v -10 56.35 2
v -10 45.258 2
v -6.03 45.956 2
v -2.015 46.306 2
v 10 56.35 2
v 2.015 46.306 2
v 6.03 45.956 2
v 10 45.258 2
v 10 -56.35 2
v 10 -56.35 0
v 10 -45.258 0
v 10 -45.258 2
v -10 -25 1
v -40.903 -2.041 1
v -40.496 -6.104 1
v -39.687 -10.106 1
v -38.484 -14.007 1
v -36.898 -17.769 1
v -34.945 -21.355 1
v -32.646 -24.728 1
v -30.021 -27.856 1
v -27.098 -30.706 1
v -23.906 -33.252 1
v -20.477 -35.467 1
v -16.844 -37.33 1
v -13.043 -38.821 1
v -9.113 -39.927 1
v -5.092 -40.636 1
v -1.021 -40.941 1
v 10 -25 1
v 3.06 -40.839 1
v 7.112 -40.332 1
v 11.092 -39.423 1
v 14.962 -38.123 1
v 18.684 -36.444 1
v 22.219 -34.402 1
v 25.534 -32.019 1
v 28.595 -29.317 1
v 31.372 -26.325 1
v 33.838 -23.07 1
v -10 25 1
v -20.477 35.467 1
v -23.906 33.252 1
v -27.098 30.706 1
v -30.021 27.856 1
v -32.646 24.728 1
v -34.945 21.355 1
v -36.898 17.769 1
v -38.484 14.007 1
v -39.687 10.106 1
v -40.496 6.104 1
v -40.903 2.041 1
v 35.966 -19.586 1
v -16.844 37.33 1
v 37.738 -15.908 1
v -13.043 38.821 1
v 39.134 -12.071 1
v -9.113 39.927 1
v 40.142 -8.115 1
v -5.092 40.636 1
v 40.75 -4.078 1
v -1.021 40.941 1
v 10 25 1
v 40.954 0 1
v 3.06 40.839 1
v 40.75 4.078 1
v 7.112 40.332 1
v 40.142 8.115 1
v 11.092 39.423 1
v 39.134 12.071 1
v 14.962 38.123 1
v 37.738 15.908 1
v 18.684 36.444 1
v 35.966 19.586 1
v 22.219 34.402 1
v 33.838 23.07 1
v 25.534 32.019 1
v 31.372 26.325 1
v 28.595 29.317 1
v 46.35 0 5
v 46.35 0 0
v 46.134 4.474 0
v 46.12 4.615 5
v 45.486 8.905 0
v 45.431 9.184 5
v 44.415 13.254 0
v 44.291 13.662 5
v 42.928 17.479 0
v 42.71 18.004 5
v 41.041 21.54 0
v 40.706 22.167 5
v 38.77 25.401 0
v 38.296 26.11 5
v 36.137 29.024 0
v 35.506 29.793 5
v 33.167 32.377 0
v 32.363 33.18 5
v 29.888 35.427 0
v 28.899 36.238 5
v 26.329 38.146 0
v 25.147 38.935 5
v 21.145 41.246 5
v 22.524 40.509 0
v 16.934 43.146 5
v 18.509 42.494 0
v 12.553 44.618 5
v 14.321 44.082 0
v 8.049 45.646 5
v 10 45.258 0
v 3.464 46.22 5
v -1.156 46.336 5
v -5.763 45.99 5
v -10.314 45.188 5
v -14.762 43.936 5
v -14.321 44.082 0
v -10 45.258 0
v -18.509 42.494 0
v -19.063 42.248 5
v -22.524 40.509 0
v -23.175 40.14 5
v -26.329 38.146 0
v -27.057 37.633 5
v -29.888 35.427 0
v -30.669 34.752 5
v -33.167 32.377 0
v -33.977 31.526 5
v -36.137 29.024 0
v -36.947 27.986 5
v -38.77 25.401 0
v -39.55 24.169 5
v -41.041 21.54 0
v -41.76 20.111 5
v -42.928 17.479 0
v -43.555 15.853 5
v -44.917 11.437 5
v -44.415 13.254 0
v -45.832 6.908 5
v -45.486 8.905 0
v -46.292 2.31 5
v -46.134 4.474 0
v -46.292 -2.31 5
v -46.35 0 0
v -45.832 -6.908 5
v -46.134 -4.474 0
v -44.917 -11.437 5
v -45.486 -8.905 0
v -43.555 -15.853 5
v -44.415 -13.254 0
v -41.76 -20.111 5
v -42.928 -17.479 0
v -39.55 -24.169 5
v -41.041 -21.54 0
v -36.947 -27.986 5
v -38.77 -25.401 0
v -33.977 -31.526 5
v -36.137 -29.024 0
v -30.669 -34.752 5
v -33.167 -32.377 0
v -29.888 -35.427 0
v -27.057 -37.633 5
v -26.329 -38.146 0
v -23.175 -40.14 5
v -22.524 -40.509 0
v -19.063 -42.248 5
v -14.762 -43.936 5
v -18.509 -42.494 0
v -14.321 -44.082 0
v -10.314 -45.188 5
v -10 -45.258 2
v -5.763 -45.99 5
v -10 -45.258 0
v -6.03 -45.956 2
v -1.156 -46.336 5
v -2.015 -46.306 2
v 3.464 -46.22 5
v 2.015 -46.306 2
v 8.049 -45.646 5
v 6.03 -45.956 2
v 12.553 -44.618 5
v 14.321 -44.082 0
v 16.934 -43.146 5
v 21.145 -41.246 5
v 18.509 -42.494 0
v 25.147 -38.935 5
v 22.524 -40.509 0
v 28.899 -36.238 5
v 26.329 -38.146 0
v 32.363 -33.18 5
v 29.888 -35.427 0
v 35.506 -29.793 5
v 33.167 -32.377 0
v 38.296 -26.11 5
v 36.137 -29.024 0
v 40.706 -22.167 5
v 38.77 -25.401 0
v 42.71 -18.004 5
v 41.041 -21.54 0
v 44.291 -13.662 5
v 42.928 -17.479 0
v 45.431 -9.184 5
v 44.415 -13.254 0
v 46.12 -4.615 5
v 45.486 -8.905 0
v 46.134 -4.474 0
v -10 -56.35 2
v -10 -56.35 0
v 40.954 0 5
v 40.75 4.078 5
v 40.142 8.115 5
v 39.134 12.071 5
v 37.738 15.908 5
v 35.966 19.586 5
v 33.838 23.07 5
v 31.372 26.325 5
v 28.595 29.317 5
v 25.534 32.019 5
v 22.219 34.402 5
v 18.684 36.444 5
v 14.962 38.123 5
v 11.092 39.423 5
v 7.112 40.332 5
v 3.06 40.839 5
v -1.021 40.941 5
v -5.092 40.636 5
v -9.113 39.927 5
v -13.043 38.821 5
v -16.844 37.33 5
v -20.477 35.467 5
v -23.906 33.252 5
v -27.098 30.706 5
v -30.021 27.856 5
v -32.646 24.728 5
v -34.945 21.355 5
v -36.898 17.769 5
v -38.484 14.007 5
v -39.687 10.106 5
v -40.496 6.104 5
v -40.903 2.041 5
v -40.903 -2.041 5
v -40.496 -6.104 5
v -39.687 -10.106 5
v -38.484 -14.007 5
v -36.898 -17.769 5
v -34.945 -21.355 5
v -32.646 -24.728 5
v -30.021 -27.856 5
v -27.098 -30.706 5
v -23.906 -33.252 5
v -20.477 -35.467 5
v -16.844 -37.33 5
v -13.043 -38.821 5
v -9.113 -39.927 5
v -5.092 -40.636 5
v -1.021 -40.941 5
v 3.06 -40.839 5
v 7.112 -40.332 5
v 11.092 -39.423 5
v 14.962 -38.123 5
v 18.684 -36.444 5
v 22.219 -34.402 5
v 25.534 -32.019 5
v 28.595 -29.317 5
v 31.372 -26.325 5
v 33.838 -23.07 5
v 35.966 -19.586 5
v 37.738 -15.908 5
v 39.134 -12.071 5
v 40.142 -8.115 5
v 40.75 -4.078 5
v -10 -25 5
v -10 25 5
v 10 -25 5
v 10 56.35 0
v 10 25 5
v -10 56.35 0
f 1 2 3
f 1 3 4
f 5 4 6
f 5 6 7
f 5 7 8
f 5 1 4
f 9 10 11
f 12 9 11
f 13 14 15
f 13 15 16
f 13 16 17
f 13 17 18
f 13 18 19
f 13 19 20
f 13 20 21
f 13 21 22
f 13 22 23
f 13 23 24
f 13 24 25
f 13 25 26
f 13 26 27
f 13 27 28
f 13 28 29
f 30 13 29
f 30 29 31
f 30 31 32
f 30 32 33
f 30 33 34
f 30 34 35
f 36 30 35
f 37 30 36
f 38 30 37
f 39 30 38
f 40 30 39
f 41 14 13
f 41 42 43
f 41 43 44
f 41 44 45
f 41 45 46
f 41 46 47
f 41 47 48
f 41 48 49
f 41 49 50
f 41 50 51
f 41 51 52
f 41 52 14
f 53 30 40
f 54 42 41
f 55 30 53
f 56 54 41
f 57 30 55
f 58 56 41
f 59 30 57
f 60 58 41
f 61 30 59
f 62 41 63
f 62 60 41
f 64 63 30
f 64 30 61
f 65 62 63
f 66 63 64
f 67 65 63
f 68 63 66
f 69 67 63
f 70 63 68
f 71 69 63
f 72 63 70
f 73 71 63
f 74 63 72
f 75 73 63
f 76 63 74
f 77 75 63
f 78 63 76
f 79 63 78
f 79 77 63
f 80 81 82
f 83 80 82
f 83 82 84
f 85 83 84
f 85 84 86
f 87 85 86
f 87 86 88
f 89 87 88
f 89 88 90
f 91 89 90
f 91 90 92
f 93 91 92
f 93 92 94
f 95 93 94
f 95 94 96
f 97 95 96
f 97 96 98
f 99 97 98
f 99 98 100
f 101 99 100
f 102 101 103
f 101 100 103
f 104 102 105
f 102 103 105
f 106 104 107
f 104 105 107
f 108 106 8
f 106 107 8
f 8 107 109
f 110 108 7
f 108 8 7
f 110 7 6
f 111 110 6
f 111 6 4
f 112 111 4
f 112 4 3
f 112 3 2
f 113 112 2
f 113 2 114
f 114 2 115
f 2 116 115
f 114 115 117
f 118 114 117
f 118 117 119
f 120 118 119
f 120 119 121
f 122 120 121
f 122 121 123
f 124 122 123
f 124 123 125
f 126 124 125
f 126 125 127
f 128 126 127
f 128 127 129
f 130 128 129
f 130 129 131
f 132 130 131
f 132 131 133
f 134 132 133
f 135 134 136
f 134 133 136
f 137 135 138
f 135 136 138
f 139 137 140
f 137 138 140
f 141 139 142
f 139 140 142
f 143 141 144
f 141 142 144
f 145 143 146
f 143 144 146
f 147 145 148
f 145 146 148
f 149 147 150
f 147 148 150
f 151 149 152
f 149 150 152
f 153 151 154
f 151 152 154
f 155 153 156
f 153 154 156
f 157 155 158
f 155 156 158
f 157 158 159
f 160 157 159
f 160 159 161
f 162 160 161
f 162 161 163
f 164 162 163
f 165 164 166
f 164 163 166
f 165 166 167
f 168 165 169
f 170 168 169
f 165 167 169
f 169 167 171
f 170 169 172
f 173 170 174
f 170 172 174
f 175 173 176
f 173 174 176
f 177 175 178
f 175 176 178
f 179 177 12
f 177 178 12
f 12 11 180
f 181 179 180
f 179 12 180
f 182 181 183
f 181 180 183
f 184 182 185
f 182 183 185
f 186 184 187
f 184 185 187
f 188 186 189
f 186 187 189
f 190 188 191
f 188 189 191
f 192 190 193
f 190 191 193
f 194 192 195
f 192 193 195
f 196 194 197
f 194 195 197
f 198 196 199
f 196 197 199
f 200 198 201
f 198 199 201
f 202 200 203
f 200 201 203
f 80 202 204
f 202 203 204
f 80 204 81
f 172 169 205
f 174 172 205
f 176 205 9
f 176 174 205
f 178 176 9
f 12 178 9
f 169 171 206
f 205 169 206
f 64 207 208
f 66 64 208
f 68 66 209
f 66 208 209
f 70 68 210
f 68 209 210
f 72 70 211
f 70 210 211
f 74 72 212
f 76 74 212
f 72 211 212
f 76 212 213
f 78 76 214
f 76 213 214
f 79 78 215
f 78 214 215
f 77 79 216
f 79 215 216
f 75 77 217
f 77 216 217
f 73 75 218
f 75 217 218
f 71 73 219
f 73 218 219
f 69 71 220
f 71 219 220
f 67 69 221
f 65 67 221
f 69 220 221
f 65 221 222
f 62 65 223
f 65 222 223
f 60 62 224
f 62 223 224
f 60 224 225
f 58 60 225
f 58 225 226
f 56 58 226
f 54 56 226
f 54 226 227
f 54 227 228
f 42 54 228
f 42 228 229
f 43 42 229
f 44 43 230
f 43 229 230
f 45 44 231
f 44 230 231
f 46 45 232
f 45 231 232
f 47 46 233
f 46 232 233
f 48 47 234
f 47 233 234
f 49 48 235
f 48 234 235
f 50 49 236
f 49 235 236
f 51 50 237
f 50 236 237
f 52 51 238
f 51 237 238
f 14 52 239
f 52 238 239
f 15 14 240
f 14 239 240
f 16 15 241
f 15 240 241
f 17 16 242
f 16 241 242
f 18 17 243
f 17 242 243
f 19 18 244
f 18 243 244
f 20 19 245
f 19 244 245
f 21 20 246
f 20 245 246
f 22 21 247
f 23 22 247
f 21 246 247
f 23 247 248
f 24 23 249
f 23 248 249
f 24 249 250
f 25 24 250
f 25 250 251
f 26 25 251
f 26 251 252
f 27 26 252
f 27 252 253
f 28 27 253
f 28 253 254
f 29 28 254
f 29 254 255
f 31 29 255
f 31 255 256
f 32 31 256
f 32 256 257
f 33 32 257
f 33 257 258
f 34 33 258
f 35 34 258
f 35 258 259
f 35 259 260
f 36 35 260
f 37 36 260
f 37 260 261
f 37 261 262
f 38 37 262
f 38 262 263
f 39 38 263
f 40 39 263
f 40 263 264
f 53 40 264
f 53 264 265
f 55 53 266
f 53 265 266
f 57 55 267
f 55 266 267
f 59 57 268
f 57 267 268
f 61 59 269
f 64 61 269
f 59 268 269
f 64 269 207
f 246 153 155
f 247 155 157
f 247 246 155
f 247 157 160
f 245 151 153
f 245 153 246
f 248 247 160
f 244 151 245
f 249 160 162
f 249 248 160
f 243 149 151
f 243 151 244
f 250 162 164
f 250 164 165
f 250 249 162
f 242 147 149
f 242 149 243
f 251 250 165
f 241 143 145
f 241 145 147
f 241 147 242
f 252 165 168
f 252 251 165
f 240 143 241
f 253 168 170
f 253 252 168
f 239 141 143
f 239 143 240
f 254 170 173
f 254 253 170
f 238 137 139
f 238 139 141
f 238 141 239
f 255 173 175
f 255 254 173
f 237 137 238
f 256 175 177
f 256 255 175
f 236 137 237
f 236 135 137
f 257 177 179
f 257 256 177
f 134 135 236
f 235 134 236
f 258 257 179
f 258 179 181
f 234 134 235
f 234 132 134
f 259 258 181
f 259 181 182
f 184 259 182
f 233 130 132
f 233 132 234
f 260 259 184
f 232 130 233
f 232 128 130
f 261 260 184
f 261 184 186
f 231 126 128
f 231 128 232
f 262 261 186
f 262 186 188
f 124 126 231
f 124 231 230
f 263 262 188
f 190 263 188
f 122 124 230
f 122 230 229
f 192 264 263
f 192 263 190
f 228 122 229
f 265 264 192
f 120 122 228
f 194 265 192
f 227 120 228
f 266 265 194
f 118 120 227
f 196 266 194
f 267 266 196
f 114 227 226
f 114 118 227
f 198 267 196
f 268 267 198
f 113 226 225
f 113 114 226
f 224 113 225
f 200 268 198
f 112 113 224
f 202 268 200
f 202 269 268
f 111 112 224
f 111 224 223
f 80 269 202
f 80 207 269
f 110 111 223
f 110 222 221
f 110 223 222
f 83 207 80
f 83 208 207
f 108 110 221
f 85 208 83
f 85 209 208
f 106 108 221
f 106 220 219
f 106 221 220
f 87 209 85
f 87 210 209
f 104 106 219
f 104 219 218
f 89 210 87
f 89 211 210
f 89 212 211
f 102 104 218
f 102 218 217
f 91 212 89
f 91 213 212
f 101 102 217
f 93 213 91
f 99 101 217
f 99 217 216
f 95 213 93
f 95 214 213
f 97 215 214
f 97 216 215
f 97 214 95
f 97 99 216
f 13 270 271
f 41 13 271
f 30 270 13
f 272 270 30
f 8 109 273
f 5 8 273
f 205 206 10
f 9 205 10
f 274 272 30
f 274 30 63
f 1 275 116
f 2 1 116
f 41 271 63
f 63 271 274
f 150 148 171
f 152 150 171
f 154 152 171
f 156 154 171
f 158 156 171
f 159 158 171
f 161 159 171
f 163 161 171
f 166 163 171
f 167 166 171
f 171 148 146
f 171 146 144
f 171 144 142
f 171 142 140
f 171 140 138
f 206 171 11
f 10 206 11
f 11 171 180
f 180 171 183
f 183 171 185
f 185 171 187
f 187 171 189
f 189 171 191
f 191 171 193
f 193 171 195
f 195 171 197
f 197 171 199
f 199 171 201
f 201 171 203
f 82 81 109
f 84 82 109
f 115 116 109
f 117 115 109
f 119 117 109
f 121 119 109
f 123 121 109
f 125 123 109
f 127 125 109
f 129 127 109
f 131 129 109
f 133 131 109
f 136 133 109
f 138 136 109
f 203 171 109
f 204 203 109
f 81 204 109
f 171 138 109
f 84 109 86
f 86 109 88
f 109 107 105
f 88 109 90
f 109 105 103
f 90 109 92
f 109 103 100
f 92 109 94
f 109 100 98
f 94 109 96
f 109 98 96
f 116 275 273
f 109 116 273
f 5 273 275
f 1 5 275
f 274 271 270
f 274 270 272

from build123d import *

# Parameters (mm, degrees)
F0_R     = 46.35
F1_DEPTH = 5
F2_R     = 40.9537225283
F2_W     = 20
F2_H     = 50
F3_DEPTH = 4
F5_DEPTH = 2
F6_DEPTH = 2


# Not quite as in the source:
# - a feature names something its author has since deleted; it is built from what else it names


with BuildPart() as f1:
    # F0 (on Top) → F1 (new body)
    with BuildSketch(Plane.XY):
        Circle(F0_R)
    extrude(amount=F1_DEPTH)

    # F2 (on face) → F3 (cut)
    with BuildSketch(Plane.XY.offset(5)):
        Circle(F2_R)
        Rectangle(F2_W, F2_H, mode=Mode.SUBTRACT)
    extrude(amount=-F3_DEPTH, mode=Mode.SUBTRACT)

    # F4 (on face) → F5 (join)
    with BuildSketch(Plane.XY):
        with BuildLine():
            Line((10, 45.2583970109), (10, 56.35))
            Line((10, 56.35), (0, 56.35))
            Line((0, 56.35), (-10, 56.35))
            Line((-10, 56.35), (-10, 45.2583970109))
            ThreePointArc((-10, 45.2583970109), (0, 46.35), (10, 45.2583970109))
        make_face()
    extrude(amount=F5_DEPTH)

    # F4 (on face) → F6 (join)
    with BuildSketch(Plane.XY):
        with BuildLine():
            Line((10, -56.35), (10, -45.2583970109))
            ThreePointArc((10, -45.2583970109), (0, -46.35), (-10, -45.2583970109))
            Line((-10, -45.2583970109), (-10, -56.35))
            Line((-10, -56.35), (10, -56.35))
        make_face()
    extrude(amount=F6_DEPTH)


solid = f1.part
